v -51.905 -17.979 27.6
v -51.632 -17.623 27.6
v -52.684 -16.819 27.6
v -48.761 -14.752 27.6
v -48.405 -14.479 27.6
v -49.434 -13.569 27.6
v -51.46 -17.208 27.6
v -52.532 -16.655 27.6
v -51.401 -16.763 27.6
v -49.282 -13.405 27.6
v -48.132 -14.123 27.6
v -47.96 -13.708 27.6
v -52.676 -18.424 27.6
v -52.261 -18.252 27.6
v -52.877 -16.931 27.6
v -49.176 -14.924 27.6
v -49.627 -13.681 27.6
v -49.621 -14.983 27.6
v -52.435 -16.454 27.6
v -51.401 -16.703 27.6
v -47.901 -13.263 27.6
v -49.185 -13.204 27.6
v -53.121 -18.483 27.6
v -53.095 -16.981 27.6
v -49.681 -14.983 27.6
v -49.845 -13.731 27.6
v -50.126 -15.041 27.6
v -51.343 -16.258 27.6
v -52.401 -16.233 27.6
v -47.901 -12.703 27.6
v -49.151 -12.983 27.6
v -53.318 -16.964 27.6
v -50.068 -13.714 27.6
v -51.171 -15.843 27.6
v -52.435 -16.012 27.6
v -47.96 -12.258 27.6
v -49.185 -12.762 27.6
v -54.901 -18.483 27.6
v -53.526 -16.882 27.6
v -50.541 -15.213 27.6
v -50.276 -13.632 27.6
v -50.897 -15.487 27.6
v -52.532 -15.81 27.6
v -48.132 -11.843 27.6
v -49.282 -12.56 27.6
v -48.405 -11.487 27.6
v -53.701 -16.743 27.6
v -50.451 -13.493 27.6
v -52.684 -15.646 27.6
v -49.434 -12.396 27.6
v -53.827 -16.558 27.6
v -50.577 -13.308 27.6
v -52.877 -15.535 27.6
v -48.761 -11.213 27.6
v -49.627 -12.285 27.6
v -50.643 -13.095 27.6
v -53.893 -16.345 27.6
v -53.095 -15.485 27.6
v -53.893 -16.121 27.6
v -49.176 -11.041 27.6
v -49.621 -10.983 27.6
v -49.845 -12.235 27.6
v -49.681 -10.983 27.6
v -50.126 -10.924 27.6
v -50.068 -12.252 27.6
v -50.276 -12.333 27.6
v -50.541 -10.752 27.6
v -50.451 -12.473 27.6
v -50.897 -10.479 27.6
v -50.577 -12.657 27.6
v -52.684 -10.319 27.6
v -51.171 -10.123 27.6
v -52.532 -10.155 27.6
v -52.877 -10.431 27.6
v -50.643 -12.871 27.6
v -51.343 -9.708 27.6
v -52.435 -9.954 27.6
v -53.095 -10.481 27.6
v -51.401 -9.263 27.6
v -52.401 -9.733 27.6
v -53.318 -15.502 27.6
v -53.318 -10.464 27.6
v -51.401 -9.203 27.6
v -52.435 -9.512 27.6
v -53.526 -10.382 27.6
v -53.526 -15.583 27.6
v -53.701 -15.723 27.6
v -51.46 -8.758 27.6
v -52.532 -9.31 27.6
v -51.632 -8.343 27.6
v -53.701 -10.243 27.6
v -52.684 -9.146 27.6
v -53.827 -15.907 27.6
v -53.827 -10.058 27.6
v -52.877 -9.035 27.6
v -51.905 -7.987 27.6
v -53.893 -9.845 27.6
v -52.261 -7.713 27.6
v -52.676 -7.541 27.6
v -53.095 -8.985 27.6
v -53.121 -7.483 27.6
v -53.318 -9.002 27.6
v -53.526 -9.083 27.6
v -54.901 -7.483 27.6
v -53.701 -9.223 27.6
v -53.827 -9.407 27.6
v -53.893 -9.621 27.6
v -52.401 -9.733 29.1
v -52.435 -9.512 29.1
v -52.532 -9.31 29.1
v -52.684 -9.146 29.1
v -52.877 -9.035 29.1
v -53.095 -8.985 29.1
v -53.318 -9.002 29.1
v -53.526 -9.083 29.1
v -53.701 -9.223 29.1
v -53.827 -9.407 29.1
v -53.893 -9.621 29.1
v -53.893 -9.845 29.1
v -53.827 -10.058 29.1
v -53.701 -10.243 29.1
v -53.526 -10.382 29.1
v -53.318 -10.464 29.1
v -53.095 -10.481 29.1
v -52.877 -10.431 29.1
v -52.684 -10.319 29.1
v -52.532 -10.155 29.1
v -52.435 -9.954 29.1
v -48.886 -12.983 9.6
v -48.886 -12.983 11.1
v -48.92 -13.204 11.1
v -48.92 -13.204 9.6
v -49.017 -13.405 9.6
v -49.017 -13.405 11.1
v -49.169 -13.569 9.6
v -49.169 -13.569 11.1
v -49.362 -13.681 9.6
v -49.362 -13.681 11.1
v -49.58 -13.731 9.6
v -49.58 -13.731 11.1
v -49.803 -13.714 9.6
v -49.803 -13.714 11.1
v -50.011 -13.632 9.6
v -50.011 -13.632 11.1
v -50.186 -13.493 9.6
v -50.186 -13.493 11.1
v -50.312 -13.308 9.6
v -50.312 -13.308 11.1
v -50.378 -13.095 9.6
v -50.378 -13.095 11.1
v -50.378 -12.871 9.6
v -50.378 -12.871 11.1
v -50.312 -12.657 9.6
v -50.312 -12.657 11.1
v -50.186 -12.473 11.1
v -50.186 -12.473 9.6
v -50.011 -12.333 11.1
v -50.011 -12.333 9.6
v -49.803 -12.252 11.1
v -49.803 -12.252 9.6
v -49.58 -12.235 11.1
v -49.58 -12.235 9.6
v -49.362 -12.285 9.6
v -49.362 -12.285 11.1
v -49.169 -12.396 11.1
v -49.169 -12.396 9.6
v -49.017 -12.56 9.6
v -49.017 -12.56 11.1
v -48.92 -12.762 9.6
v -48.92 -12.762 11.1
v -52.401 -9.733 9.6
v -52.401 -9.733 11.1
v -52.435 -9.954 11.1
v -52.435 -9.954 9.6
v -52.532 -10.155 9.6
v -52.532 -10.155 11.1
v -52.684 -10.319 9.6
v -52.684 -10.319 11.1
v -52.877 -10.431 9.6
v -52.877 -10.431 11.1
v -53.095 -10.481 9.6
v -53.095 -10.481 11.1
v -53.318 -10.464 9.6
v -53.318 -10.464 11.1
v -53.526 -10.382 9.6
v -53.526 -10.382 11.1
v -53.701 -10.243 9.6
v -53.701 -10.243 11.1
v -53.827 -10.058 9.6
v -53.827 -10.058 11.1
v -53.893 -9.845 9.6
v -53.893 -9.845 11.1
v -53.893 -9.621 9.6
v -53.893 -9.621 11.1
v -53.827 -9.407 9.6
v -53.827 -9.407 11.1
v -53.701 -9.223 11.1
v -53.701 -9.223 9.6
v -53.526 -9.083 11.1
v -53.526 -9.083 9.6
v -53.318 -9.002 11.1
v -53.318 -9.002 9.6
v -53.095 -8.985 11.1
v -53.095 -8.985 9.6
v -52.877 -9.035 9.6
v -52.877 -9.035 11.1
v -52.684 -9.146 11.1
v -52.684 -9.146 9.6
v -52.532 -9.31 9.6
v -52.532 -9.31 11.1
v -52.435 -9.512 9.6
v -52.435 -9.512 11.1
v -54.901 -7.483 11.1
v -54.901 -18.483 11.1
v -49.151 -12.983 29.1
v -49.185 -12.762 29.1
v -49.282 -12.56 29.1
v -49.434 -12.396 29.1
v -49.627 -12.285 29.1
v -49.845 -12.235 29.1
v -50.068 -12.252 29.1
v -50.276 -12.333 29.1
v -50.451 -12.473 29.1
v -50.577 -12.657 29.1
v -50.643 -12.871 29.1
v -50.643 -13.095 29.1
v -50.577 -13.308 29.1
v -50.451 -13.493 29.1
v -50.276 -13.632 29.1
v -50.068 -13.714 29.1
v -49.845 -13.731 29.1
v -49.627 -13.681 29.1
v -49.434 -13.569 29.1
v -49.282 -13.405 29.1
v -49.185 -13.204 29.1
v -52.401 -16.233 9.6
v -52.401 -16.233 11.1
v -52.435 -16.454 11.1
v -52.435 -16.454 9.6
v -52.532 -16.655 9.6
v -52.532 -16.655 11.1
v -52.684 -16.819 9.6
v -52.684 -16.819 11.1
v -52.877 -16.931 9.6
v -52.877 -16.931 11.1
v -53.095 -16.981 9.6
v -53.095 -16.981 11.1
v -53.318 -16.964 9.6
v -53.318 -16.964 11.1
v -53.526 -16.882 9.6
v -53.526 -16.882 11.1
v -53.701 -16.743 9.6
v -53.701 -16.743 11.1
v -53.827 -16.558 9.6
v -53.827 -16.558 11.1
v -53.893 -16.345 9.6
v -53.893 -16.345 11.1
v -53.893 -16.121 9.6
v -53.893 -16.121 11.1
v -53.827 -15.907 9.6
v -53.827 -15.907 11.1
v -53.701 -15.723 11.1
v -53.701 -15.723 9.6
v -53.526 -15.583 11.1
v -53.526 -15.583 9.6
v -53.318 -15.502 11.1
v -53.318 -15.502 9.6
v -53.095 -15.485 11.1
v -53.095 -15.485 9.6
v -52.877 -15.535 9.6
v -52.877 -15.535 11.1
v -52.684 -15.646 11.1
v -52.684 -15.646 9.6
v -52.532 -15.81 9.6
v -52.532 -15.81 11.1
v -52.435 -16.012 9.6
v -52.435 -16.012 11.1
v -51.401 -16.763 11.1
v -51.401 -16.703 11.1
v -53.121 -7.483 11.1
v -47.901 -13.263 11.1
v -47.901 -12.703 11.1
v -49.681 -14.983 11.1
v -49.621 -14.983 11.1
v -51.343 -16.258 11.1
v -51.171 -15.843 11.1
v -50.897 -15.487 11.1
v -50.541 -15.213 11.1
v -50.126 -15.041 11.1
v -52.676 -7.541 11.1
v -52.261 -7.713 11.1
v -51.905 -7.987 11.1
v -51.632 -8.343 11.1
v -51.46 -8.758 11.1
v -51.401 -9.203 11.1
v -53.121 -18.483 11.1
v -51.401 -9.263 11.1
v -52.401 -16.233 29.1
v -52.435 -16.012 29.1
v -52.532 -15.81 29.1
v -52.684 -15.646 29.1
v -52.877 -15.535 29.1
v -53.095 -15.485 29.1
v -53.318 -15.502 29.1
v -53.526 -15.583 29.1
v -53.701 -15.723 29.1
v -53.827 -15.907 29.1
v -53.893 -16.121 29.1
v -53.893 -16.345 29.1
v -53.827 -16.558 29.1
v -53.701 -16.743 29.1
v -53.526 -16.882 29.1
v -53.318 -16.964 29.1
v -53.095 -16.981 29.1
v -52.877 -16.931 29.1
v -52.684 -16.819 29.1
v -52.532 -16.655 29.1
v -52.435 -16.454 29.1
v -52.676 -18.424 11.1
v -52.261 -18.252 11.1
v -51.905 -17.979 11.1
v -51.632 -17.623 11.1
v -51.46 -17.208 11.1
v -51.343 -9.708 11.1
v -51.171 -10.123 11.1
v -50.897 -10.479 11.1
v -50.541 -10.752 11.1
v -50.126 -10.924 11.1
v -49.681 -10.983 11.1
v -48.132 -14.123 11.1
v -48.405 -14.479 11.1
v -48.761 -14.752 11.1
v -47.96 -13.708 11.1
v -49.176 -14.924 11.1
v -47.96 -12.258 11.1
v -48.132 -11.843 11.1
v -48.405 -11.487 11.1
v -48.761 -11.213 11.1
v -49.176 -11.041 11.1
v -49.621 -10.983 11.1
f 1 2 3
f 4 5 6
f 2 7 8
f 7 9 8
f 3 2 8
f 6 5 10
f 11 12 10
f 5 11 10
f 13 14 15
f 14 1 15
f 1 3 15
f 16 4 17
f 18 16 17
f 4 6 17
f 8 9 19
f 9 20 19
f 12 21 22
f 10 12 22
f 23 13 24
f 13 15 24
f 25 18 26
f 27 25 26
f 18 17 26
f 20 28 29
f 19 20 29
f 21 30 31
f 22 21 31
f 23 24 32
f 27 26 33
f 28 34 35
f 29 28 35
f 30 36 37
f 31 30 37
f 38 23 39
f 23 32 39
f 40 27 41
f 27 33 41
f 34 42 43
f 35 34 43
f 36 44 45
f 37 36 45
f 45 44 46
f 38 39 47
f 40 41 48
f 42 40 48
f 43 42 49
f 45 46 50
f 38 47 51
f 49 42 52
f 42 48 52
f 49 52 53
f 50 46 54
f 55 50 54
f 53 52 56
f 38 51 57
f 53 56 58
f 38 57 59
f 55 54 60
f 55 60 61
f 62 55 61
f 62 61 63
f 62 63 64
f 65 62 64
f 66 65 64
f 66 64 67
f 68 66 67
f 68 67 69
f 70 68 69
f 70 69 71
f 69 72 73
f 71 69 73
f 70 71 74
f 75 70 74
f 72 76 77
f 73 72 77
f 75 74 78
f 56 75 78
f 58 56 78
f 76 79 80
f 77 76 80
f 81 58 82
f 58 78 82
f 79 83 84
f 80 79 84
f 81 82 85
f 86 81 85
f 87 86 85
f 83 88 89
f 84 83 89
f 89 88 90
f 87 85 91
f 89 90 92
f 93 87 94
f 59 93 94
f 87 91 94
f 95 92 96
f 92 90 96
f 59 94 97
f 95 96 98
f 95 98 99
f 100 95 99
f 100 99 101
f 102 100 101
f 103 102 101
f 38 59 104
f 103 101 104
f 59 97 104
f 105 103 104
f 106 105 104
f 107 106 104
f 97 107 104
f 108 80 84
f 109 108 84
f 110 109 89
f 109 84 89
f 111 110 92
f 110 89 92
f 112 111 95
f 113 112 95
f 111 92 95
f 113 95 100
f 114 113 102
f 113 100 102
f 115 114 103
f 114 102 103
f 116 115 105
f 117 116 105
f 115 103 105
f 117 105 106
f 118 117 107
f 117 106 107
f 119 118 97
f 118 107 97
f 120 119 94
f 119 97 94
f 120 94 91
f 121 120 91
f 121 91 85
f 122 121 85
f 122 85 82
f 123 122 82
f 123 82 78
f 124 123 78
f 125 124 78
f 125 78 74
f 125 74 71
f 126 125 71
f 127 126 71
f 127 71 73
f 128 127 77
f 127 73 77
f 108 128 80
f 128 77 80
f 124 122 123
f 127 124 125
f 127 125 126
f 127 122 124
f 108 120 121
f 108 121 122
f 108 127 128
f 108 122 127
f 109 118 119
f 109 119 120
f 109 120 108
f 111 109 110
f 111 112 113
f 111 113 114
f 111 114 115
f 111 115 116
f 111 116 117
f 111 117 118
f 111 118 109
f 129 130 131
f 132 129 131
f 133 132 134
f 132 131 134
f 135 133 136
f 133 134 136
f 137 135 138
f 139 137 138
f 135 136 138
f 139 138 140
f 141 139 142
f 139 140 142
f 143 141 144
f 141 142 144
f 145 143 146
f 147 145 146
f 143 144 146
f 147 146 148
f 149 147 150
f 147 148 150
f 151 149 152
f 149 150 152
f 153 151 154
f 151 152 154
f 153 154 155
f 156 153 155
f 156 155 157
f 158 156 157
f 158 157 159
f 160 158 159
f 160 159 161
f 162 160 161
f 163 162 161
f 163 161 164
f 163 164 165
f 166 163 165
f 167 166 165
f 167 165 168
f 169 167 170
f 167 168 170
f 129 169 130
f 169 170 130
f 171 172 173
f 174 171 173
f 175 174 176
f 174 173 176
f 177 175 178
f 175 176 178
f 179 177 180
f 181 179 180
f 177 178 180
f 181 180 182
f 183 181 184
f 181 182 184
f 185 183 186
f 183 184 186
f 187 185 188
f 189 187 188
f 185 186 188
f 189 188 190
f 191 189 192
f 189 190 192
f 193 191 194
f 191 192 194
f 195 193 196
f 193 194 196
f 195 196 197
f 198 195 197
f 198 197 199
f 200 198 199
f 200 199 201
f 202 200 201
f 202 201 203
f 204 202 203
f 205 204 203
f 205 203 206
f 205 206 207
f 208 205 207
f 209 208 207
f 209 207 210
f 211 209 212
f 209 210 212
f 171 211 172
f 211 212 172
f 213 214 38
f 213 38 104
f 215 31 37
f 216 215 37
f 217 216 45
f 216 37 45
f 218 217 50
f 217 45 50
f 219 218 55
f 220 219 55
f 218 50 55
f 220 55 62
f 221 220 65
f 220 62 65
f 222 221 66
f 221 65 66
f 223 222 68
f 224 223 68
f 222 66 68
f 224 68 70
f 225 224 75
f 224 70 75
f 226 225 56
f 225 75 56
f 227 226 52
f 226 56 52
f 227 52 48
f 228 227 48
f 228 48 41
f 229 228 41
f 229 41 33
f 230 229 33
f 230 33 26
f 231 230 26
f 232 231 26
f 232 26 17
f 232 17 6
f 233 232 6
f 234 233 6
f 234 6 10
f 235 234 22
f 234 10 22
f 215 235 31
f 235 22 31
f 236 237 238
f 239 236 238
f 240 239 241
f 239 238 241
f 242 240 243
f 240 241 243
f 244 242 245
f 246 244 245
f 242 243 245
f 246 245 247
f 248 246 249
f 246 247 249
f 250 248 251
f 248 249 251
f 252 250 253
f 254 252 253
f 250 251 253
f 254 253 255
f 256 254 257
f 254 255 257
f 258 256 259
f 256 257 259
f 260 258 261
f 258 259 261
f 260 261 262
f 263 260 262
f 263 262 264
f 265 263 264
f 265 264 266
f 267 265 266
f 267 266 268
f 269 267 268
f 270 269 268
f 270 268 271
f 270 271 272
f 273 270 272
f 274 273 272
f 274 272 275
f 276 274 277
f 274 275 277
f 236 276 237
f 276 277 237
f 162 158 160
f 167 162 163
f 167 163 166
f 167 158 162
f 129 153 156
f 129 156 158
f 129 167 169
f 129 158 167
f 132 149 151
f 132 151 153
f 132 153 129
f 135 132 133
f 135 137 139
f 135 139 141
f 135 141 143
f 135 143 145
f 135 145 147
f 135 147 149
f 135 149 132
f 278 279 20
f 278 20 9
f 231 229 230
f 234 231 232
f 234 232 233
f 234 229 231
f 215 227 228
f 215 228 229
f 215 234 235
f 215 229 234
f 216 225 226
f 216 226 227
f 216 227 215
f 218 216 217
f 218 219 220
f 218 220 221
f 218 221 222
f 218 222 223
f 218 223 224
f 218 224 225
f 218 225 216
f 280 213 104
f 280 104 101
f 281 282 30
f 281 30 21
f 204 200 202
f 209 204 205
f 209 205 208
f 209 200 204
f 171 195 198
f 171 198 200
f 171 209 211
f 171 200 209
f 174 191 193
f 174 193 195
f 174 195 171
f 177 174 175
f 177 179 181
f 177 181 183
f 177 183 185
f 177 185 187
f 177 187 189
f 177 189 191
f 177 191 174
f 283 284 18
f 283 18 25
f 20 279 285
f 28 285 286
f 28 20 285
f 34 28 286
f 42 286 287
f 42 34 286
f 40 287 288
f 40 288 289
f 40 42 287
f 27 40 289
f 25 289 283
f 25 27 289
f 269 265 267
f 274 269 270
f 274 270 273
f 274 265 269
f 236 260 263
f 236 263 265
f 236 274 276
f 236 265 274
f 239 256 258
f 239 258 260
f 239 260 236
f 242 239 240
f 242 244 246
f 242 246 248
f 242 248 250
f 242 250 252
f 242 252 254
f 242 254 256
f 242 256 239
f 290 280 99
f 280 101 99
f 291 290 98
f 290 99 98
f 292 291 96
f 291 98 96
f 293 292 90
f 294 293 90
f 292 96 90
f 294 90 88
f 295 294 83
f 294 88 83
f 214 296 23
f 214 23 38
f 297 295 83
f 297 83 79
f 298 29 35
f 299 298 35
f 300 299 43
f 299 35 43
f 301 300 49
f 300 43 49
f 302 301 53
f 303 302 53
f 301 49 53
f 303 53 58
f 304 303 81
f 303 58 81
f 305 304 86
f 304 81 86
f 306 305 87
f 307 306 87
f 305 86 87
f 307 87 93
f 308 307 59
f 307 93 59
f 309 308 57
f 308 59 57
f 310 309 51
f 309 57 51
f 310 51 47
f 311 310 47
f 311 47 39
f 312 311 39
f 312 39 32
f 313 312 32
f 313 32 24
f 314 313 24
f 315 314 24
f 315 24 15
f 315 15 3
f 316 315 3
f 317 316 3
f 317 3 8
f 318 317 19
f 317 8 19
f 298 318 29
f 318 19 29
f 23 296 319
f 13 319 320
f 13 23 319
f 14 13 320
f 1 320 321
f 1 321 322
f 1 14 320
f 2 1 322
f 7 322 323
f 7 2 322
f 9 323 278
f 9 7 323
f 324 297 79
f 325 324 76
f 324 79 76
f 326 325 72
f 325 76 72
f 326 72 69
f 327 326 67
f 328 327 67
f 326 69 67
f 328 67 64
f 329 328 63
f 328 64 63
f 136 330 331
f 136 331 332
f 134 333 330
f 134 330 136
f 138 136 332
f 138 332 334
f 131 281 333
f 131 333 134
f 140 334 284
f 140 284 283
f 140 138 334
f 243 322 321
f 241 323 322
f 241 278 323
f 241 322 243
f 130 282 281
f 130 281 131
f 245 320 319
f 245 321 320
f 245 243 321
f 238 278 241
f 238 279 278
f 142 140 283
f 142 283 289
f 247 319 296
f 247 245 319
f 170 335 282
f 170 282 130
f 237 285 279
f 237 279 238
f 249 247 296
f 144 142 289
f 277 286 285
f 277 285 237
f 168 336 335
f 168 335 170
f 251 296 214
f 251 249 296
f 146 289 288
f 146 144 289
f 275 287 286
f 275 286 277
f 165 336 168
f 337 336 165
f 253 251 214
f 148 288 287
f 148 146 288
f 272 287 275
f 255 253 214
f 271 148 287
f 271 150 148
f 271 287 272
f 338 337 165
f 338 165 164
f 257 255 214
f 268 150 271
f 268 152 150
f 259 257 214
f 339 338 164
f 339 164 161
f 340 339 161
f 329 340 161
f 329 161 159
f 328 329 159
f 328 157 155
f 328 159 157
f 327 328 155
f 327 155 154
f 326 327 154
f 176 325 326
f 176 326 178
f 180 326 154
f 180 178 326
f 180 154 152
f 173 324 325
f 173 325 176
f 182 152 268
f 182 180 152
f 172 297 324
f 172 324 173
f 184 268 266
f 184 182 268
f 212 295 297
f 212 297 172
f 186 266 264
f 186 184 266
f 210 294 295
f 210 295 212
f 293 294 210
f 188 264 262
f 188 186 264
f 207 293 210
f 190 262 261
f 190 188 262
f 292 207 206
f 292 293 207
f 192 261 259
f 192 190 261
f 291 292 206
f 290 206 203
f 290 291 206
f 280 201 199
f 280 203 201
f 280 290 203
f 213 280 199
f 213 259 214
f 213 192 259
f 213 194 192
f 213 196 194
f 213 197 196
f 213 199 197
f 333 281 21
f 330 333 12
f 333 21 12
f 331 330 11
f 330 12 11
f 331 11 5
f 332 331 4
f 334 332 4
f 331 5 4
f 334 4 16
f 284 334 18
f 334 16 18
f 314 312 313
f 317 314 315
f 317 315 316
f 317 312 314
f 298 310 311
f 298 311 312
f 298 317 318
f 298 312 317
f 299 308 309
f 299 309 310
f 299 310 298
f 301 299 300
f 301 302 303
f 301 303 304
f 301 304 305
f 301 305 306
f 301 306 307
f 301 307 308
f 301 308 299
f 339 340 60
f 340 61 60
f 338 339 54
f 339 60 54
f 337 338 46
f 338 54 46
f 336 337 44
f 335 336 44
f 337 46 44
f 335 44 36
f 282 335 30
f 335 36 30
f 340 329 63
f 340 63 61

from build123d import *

# Parameters (mm, degrees)
PAD010_DEPTH = 16.5
SKETCH017_R  = 0.75
PAD012_DEPTH = 1.5
SKETCH019_R  = 0.75
PAD013_DEPTH = 1.5
FILLET010_R  = 1.72


with BuildPart() as part:
    # Sketch016 → Pad010 (new body)
    with BuildSketch(Plane.XY):
        Polygon((-53.501251, -22.682802), (-50.001251, -22.682802), (-50.001251, -26.182802), (-46.501251, -26.182802), (-46.501251, -30.182802), (-50.001251, -30.182802), (-50.001251, -33.682802), (-53.501251, -33.682802), align=None)
    extrude(amount=PAD010_DEPTH)

    # Sketch017 (on Face10 of Pad010) → Pad012 (join)
    with BuildSketch(Plane.XY.offset(16.5)):
        with Locations((-51.751251, -24.932802)):
            Circle(SKETCH017_R)
        with Locations((-51.751251, -31.432802)):
            Circle(SKETCH017_R)
        with Locations((-48.501251, -28.182802)):
            Circle(SKETCH017_R)
    extrude(amount=PAD012_DEPTH)

    # Sketch019 → Pad013 (join)
    with BuildSketch(Plane(origin=(0, 0, 0), x_dir=(1, 0, 0), z_dir=(0, 0, -1))):
        with Locations((-51.751251, 31.432802)):
            Circle(SKETCH019_R)
        with Locations((-51.751251, 24.932802)):
            Circle(SKETCH019_R)
        with Locations((-48.236244, 28.182802)):
            Circle(SKETCH019_R)
    extrude(amount=PAD013_DEPTH)

    # Fillet010
    fillet010_edges = [part.edges().sort_by_distance(p)[0] for p in [
        (-50.001251, -30.182802, 8.25),
        (-50.001251, -33.682802, 8.25),
        (-46.501251, -30.182802, 8.25),
        (-46.501251, -26.182802, 8.25),
        (-50.001251, -22.682802, 8.25),
        (-50.001251, -26.182802, 8.25),
    ]]
    fillet(fillet010_edges, radius=FILLET010_R)


with BuildPart() as part_1:
    # Body003 placement: moved
    add(part.part.moved(Location((-1.4, 15.2, 11.1))))


solid = part_1.part
